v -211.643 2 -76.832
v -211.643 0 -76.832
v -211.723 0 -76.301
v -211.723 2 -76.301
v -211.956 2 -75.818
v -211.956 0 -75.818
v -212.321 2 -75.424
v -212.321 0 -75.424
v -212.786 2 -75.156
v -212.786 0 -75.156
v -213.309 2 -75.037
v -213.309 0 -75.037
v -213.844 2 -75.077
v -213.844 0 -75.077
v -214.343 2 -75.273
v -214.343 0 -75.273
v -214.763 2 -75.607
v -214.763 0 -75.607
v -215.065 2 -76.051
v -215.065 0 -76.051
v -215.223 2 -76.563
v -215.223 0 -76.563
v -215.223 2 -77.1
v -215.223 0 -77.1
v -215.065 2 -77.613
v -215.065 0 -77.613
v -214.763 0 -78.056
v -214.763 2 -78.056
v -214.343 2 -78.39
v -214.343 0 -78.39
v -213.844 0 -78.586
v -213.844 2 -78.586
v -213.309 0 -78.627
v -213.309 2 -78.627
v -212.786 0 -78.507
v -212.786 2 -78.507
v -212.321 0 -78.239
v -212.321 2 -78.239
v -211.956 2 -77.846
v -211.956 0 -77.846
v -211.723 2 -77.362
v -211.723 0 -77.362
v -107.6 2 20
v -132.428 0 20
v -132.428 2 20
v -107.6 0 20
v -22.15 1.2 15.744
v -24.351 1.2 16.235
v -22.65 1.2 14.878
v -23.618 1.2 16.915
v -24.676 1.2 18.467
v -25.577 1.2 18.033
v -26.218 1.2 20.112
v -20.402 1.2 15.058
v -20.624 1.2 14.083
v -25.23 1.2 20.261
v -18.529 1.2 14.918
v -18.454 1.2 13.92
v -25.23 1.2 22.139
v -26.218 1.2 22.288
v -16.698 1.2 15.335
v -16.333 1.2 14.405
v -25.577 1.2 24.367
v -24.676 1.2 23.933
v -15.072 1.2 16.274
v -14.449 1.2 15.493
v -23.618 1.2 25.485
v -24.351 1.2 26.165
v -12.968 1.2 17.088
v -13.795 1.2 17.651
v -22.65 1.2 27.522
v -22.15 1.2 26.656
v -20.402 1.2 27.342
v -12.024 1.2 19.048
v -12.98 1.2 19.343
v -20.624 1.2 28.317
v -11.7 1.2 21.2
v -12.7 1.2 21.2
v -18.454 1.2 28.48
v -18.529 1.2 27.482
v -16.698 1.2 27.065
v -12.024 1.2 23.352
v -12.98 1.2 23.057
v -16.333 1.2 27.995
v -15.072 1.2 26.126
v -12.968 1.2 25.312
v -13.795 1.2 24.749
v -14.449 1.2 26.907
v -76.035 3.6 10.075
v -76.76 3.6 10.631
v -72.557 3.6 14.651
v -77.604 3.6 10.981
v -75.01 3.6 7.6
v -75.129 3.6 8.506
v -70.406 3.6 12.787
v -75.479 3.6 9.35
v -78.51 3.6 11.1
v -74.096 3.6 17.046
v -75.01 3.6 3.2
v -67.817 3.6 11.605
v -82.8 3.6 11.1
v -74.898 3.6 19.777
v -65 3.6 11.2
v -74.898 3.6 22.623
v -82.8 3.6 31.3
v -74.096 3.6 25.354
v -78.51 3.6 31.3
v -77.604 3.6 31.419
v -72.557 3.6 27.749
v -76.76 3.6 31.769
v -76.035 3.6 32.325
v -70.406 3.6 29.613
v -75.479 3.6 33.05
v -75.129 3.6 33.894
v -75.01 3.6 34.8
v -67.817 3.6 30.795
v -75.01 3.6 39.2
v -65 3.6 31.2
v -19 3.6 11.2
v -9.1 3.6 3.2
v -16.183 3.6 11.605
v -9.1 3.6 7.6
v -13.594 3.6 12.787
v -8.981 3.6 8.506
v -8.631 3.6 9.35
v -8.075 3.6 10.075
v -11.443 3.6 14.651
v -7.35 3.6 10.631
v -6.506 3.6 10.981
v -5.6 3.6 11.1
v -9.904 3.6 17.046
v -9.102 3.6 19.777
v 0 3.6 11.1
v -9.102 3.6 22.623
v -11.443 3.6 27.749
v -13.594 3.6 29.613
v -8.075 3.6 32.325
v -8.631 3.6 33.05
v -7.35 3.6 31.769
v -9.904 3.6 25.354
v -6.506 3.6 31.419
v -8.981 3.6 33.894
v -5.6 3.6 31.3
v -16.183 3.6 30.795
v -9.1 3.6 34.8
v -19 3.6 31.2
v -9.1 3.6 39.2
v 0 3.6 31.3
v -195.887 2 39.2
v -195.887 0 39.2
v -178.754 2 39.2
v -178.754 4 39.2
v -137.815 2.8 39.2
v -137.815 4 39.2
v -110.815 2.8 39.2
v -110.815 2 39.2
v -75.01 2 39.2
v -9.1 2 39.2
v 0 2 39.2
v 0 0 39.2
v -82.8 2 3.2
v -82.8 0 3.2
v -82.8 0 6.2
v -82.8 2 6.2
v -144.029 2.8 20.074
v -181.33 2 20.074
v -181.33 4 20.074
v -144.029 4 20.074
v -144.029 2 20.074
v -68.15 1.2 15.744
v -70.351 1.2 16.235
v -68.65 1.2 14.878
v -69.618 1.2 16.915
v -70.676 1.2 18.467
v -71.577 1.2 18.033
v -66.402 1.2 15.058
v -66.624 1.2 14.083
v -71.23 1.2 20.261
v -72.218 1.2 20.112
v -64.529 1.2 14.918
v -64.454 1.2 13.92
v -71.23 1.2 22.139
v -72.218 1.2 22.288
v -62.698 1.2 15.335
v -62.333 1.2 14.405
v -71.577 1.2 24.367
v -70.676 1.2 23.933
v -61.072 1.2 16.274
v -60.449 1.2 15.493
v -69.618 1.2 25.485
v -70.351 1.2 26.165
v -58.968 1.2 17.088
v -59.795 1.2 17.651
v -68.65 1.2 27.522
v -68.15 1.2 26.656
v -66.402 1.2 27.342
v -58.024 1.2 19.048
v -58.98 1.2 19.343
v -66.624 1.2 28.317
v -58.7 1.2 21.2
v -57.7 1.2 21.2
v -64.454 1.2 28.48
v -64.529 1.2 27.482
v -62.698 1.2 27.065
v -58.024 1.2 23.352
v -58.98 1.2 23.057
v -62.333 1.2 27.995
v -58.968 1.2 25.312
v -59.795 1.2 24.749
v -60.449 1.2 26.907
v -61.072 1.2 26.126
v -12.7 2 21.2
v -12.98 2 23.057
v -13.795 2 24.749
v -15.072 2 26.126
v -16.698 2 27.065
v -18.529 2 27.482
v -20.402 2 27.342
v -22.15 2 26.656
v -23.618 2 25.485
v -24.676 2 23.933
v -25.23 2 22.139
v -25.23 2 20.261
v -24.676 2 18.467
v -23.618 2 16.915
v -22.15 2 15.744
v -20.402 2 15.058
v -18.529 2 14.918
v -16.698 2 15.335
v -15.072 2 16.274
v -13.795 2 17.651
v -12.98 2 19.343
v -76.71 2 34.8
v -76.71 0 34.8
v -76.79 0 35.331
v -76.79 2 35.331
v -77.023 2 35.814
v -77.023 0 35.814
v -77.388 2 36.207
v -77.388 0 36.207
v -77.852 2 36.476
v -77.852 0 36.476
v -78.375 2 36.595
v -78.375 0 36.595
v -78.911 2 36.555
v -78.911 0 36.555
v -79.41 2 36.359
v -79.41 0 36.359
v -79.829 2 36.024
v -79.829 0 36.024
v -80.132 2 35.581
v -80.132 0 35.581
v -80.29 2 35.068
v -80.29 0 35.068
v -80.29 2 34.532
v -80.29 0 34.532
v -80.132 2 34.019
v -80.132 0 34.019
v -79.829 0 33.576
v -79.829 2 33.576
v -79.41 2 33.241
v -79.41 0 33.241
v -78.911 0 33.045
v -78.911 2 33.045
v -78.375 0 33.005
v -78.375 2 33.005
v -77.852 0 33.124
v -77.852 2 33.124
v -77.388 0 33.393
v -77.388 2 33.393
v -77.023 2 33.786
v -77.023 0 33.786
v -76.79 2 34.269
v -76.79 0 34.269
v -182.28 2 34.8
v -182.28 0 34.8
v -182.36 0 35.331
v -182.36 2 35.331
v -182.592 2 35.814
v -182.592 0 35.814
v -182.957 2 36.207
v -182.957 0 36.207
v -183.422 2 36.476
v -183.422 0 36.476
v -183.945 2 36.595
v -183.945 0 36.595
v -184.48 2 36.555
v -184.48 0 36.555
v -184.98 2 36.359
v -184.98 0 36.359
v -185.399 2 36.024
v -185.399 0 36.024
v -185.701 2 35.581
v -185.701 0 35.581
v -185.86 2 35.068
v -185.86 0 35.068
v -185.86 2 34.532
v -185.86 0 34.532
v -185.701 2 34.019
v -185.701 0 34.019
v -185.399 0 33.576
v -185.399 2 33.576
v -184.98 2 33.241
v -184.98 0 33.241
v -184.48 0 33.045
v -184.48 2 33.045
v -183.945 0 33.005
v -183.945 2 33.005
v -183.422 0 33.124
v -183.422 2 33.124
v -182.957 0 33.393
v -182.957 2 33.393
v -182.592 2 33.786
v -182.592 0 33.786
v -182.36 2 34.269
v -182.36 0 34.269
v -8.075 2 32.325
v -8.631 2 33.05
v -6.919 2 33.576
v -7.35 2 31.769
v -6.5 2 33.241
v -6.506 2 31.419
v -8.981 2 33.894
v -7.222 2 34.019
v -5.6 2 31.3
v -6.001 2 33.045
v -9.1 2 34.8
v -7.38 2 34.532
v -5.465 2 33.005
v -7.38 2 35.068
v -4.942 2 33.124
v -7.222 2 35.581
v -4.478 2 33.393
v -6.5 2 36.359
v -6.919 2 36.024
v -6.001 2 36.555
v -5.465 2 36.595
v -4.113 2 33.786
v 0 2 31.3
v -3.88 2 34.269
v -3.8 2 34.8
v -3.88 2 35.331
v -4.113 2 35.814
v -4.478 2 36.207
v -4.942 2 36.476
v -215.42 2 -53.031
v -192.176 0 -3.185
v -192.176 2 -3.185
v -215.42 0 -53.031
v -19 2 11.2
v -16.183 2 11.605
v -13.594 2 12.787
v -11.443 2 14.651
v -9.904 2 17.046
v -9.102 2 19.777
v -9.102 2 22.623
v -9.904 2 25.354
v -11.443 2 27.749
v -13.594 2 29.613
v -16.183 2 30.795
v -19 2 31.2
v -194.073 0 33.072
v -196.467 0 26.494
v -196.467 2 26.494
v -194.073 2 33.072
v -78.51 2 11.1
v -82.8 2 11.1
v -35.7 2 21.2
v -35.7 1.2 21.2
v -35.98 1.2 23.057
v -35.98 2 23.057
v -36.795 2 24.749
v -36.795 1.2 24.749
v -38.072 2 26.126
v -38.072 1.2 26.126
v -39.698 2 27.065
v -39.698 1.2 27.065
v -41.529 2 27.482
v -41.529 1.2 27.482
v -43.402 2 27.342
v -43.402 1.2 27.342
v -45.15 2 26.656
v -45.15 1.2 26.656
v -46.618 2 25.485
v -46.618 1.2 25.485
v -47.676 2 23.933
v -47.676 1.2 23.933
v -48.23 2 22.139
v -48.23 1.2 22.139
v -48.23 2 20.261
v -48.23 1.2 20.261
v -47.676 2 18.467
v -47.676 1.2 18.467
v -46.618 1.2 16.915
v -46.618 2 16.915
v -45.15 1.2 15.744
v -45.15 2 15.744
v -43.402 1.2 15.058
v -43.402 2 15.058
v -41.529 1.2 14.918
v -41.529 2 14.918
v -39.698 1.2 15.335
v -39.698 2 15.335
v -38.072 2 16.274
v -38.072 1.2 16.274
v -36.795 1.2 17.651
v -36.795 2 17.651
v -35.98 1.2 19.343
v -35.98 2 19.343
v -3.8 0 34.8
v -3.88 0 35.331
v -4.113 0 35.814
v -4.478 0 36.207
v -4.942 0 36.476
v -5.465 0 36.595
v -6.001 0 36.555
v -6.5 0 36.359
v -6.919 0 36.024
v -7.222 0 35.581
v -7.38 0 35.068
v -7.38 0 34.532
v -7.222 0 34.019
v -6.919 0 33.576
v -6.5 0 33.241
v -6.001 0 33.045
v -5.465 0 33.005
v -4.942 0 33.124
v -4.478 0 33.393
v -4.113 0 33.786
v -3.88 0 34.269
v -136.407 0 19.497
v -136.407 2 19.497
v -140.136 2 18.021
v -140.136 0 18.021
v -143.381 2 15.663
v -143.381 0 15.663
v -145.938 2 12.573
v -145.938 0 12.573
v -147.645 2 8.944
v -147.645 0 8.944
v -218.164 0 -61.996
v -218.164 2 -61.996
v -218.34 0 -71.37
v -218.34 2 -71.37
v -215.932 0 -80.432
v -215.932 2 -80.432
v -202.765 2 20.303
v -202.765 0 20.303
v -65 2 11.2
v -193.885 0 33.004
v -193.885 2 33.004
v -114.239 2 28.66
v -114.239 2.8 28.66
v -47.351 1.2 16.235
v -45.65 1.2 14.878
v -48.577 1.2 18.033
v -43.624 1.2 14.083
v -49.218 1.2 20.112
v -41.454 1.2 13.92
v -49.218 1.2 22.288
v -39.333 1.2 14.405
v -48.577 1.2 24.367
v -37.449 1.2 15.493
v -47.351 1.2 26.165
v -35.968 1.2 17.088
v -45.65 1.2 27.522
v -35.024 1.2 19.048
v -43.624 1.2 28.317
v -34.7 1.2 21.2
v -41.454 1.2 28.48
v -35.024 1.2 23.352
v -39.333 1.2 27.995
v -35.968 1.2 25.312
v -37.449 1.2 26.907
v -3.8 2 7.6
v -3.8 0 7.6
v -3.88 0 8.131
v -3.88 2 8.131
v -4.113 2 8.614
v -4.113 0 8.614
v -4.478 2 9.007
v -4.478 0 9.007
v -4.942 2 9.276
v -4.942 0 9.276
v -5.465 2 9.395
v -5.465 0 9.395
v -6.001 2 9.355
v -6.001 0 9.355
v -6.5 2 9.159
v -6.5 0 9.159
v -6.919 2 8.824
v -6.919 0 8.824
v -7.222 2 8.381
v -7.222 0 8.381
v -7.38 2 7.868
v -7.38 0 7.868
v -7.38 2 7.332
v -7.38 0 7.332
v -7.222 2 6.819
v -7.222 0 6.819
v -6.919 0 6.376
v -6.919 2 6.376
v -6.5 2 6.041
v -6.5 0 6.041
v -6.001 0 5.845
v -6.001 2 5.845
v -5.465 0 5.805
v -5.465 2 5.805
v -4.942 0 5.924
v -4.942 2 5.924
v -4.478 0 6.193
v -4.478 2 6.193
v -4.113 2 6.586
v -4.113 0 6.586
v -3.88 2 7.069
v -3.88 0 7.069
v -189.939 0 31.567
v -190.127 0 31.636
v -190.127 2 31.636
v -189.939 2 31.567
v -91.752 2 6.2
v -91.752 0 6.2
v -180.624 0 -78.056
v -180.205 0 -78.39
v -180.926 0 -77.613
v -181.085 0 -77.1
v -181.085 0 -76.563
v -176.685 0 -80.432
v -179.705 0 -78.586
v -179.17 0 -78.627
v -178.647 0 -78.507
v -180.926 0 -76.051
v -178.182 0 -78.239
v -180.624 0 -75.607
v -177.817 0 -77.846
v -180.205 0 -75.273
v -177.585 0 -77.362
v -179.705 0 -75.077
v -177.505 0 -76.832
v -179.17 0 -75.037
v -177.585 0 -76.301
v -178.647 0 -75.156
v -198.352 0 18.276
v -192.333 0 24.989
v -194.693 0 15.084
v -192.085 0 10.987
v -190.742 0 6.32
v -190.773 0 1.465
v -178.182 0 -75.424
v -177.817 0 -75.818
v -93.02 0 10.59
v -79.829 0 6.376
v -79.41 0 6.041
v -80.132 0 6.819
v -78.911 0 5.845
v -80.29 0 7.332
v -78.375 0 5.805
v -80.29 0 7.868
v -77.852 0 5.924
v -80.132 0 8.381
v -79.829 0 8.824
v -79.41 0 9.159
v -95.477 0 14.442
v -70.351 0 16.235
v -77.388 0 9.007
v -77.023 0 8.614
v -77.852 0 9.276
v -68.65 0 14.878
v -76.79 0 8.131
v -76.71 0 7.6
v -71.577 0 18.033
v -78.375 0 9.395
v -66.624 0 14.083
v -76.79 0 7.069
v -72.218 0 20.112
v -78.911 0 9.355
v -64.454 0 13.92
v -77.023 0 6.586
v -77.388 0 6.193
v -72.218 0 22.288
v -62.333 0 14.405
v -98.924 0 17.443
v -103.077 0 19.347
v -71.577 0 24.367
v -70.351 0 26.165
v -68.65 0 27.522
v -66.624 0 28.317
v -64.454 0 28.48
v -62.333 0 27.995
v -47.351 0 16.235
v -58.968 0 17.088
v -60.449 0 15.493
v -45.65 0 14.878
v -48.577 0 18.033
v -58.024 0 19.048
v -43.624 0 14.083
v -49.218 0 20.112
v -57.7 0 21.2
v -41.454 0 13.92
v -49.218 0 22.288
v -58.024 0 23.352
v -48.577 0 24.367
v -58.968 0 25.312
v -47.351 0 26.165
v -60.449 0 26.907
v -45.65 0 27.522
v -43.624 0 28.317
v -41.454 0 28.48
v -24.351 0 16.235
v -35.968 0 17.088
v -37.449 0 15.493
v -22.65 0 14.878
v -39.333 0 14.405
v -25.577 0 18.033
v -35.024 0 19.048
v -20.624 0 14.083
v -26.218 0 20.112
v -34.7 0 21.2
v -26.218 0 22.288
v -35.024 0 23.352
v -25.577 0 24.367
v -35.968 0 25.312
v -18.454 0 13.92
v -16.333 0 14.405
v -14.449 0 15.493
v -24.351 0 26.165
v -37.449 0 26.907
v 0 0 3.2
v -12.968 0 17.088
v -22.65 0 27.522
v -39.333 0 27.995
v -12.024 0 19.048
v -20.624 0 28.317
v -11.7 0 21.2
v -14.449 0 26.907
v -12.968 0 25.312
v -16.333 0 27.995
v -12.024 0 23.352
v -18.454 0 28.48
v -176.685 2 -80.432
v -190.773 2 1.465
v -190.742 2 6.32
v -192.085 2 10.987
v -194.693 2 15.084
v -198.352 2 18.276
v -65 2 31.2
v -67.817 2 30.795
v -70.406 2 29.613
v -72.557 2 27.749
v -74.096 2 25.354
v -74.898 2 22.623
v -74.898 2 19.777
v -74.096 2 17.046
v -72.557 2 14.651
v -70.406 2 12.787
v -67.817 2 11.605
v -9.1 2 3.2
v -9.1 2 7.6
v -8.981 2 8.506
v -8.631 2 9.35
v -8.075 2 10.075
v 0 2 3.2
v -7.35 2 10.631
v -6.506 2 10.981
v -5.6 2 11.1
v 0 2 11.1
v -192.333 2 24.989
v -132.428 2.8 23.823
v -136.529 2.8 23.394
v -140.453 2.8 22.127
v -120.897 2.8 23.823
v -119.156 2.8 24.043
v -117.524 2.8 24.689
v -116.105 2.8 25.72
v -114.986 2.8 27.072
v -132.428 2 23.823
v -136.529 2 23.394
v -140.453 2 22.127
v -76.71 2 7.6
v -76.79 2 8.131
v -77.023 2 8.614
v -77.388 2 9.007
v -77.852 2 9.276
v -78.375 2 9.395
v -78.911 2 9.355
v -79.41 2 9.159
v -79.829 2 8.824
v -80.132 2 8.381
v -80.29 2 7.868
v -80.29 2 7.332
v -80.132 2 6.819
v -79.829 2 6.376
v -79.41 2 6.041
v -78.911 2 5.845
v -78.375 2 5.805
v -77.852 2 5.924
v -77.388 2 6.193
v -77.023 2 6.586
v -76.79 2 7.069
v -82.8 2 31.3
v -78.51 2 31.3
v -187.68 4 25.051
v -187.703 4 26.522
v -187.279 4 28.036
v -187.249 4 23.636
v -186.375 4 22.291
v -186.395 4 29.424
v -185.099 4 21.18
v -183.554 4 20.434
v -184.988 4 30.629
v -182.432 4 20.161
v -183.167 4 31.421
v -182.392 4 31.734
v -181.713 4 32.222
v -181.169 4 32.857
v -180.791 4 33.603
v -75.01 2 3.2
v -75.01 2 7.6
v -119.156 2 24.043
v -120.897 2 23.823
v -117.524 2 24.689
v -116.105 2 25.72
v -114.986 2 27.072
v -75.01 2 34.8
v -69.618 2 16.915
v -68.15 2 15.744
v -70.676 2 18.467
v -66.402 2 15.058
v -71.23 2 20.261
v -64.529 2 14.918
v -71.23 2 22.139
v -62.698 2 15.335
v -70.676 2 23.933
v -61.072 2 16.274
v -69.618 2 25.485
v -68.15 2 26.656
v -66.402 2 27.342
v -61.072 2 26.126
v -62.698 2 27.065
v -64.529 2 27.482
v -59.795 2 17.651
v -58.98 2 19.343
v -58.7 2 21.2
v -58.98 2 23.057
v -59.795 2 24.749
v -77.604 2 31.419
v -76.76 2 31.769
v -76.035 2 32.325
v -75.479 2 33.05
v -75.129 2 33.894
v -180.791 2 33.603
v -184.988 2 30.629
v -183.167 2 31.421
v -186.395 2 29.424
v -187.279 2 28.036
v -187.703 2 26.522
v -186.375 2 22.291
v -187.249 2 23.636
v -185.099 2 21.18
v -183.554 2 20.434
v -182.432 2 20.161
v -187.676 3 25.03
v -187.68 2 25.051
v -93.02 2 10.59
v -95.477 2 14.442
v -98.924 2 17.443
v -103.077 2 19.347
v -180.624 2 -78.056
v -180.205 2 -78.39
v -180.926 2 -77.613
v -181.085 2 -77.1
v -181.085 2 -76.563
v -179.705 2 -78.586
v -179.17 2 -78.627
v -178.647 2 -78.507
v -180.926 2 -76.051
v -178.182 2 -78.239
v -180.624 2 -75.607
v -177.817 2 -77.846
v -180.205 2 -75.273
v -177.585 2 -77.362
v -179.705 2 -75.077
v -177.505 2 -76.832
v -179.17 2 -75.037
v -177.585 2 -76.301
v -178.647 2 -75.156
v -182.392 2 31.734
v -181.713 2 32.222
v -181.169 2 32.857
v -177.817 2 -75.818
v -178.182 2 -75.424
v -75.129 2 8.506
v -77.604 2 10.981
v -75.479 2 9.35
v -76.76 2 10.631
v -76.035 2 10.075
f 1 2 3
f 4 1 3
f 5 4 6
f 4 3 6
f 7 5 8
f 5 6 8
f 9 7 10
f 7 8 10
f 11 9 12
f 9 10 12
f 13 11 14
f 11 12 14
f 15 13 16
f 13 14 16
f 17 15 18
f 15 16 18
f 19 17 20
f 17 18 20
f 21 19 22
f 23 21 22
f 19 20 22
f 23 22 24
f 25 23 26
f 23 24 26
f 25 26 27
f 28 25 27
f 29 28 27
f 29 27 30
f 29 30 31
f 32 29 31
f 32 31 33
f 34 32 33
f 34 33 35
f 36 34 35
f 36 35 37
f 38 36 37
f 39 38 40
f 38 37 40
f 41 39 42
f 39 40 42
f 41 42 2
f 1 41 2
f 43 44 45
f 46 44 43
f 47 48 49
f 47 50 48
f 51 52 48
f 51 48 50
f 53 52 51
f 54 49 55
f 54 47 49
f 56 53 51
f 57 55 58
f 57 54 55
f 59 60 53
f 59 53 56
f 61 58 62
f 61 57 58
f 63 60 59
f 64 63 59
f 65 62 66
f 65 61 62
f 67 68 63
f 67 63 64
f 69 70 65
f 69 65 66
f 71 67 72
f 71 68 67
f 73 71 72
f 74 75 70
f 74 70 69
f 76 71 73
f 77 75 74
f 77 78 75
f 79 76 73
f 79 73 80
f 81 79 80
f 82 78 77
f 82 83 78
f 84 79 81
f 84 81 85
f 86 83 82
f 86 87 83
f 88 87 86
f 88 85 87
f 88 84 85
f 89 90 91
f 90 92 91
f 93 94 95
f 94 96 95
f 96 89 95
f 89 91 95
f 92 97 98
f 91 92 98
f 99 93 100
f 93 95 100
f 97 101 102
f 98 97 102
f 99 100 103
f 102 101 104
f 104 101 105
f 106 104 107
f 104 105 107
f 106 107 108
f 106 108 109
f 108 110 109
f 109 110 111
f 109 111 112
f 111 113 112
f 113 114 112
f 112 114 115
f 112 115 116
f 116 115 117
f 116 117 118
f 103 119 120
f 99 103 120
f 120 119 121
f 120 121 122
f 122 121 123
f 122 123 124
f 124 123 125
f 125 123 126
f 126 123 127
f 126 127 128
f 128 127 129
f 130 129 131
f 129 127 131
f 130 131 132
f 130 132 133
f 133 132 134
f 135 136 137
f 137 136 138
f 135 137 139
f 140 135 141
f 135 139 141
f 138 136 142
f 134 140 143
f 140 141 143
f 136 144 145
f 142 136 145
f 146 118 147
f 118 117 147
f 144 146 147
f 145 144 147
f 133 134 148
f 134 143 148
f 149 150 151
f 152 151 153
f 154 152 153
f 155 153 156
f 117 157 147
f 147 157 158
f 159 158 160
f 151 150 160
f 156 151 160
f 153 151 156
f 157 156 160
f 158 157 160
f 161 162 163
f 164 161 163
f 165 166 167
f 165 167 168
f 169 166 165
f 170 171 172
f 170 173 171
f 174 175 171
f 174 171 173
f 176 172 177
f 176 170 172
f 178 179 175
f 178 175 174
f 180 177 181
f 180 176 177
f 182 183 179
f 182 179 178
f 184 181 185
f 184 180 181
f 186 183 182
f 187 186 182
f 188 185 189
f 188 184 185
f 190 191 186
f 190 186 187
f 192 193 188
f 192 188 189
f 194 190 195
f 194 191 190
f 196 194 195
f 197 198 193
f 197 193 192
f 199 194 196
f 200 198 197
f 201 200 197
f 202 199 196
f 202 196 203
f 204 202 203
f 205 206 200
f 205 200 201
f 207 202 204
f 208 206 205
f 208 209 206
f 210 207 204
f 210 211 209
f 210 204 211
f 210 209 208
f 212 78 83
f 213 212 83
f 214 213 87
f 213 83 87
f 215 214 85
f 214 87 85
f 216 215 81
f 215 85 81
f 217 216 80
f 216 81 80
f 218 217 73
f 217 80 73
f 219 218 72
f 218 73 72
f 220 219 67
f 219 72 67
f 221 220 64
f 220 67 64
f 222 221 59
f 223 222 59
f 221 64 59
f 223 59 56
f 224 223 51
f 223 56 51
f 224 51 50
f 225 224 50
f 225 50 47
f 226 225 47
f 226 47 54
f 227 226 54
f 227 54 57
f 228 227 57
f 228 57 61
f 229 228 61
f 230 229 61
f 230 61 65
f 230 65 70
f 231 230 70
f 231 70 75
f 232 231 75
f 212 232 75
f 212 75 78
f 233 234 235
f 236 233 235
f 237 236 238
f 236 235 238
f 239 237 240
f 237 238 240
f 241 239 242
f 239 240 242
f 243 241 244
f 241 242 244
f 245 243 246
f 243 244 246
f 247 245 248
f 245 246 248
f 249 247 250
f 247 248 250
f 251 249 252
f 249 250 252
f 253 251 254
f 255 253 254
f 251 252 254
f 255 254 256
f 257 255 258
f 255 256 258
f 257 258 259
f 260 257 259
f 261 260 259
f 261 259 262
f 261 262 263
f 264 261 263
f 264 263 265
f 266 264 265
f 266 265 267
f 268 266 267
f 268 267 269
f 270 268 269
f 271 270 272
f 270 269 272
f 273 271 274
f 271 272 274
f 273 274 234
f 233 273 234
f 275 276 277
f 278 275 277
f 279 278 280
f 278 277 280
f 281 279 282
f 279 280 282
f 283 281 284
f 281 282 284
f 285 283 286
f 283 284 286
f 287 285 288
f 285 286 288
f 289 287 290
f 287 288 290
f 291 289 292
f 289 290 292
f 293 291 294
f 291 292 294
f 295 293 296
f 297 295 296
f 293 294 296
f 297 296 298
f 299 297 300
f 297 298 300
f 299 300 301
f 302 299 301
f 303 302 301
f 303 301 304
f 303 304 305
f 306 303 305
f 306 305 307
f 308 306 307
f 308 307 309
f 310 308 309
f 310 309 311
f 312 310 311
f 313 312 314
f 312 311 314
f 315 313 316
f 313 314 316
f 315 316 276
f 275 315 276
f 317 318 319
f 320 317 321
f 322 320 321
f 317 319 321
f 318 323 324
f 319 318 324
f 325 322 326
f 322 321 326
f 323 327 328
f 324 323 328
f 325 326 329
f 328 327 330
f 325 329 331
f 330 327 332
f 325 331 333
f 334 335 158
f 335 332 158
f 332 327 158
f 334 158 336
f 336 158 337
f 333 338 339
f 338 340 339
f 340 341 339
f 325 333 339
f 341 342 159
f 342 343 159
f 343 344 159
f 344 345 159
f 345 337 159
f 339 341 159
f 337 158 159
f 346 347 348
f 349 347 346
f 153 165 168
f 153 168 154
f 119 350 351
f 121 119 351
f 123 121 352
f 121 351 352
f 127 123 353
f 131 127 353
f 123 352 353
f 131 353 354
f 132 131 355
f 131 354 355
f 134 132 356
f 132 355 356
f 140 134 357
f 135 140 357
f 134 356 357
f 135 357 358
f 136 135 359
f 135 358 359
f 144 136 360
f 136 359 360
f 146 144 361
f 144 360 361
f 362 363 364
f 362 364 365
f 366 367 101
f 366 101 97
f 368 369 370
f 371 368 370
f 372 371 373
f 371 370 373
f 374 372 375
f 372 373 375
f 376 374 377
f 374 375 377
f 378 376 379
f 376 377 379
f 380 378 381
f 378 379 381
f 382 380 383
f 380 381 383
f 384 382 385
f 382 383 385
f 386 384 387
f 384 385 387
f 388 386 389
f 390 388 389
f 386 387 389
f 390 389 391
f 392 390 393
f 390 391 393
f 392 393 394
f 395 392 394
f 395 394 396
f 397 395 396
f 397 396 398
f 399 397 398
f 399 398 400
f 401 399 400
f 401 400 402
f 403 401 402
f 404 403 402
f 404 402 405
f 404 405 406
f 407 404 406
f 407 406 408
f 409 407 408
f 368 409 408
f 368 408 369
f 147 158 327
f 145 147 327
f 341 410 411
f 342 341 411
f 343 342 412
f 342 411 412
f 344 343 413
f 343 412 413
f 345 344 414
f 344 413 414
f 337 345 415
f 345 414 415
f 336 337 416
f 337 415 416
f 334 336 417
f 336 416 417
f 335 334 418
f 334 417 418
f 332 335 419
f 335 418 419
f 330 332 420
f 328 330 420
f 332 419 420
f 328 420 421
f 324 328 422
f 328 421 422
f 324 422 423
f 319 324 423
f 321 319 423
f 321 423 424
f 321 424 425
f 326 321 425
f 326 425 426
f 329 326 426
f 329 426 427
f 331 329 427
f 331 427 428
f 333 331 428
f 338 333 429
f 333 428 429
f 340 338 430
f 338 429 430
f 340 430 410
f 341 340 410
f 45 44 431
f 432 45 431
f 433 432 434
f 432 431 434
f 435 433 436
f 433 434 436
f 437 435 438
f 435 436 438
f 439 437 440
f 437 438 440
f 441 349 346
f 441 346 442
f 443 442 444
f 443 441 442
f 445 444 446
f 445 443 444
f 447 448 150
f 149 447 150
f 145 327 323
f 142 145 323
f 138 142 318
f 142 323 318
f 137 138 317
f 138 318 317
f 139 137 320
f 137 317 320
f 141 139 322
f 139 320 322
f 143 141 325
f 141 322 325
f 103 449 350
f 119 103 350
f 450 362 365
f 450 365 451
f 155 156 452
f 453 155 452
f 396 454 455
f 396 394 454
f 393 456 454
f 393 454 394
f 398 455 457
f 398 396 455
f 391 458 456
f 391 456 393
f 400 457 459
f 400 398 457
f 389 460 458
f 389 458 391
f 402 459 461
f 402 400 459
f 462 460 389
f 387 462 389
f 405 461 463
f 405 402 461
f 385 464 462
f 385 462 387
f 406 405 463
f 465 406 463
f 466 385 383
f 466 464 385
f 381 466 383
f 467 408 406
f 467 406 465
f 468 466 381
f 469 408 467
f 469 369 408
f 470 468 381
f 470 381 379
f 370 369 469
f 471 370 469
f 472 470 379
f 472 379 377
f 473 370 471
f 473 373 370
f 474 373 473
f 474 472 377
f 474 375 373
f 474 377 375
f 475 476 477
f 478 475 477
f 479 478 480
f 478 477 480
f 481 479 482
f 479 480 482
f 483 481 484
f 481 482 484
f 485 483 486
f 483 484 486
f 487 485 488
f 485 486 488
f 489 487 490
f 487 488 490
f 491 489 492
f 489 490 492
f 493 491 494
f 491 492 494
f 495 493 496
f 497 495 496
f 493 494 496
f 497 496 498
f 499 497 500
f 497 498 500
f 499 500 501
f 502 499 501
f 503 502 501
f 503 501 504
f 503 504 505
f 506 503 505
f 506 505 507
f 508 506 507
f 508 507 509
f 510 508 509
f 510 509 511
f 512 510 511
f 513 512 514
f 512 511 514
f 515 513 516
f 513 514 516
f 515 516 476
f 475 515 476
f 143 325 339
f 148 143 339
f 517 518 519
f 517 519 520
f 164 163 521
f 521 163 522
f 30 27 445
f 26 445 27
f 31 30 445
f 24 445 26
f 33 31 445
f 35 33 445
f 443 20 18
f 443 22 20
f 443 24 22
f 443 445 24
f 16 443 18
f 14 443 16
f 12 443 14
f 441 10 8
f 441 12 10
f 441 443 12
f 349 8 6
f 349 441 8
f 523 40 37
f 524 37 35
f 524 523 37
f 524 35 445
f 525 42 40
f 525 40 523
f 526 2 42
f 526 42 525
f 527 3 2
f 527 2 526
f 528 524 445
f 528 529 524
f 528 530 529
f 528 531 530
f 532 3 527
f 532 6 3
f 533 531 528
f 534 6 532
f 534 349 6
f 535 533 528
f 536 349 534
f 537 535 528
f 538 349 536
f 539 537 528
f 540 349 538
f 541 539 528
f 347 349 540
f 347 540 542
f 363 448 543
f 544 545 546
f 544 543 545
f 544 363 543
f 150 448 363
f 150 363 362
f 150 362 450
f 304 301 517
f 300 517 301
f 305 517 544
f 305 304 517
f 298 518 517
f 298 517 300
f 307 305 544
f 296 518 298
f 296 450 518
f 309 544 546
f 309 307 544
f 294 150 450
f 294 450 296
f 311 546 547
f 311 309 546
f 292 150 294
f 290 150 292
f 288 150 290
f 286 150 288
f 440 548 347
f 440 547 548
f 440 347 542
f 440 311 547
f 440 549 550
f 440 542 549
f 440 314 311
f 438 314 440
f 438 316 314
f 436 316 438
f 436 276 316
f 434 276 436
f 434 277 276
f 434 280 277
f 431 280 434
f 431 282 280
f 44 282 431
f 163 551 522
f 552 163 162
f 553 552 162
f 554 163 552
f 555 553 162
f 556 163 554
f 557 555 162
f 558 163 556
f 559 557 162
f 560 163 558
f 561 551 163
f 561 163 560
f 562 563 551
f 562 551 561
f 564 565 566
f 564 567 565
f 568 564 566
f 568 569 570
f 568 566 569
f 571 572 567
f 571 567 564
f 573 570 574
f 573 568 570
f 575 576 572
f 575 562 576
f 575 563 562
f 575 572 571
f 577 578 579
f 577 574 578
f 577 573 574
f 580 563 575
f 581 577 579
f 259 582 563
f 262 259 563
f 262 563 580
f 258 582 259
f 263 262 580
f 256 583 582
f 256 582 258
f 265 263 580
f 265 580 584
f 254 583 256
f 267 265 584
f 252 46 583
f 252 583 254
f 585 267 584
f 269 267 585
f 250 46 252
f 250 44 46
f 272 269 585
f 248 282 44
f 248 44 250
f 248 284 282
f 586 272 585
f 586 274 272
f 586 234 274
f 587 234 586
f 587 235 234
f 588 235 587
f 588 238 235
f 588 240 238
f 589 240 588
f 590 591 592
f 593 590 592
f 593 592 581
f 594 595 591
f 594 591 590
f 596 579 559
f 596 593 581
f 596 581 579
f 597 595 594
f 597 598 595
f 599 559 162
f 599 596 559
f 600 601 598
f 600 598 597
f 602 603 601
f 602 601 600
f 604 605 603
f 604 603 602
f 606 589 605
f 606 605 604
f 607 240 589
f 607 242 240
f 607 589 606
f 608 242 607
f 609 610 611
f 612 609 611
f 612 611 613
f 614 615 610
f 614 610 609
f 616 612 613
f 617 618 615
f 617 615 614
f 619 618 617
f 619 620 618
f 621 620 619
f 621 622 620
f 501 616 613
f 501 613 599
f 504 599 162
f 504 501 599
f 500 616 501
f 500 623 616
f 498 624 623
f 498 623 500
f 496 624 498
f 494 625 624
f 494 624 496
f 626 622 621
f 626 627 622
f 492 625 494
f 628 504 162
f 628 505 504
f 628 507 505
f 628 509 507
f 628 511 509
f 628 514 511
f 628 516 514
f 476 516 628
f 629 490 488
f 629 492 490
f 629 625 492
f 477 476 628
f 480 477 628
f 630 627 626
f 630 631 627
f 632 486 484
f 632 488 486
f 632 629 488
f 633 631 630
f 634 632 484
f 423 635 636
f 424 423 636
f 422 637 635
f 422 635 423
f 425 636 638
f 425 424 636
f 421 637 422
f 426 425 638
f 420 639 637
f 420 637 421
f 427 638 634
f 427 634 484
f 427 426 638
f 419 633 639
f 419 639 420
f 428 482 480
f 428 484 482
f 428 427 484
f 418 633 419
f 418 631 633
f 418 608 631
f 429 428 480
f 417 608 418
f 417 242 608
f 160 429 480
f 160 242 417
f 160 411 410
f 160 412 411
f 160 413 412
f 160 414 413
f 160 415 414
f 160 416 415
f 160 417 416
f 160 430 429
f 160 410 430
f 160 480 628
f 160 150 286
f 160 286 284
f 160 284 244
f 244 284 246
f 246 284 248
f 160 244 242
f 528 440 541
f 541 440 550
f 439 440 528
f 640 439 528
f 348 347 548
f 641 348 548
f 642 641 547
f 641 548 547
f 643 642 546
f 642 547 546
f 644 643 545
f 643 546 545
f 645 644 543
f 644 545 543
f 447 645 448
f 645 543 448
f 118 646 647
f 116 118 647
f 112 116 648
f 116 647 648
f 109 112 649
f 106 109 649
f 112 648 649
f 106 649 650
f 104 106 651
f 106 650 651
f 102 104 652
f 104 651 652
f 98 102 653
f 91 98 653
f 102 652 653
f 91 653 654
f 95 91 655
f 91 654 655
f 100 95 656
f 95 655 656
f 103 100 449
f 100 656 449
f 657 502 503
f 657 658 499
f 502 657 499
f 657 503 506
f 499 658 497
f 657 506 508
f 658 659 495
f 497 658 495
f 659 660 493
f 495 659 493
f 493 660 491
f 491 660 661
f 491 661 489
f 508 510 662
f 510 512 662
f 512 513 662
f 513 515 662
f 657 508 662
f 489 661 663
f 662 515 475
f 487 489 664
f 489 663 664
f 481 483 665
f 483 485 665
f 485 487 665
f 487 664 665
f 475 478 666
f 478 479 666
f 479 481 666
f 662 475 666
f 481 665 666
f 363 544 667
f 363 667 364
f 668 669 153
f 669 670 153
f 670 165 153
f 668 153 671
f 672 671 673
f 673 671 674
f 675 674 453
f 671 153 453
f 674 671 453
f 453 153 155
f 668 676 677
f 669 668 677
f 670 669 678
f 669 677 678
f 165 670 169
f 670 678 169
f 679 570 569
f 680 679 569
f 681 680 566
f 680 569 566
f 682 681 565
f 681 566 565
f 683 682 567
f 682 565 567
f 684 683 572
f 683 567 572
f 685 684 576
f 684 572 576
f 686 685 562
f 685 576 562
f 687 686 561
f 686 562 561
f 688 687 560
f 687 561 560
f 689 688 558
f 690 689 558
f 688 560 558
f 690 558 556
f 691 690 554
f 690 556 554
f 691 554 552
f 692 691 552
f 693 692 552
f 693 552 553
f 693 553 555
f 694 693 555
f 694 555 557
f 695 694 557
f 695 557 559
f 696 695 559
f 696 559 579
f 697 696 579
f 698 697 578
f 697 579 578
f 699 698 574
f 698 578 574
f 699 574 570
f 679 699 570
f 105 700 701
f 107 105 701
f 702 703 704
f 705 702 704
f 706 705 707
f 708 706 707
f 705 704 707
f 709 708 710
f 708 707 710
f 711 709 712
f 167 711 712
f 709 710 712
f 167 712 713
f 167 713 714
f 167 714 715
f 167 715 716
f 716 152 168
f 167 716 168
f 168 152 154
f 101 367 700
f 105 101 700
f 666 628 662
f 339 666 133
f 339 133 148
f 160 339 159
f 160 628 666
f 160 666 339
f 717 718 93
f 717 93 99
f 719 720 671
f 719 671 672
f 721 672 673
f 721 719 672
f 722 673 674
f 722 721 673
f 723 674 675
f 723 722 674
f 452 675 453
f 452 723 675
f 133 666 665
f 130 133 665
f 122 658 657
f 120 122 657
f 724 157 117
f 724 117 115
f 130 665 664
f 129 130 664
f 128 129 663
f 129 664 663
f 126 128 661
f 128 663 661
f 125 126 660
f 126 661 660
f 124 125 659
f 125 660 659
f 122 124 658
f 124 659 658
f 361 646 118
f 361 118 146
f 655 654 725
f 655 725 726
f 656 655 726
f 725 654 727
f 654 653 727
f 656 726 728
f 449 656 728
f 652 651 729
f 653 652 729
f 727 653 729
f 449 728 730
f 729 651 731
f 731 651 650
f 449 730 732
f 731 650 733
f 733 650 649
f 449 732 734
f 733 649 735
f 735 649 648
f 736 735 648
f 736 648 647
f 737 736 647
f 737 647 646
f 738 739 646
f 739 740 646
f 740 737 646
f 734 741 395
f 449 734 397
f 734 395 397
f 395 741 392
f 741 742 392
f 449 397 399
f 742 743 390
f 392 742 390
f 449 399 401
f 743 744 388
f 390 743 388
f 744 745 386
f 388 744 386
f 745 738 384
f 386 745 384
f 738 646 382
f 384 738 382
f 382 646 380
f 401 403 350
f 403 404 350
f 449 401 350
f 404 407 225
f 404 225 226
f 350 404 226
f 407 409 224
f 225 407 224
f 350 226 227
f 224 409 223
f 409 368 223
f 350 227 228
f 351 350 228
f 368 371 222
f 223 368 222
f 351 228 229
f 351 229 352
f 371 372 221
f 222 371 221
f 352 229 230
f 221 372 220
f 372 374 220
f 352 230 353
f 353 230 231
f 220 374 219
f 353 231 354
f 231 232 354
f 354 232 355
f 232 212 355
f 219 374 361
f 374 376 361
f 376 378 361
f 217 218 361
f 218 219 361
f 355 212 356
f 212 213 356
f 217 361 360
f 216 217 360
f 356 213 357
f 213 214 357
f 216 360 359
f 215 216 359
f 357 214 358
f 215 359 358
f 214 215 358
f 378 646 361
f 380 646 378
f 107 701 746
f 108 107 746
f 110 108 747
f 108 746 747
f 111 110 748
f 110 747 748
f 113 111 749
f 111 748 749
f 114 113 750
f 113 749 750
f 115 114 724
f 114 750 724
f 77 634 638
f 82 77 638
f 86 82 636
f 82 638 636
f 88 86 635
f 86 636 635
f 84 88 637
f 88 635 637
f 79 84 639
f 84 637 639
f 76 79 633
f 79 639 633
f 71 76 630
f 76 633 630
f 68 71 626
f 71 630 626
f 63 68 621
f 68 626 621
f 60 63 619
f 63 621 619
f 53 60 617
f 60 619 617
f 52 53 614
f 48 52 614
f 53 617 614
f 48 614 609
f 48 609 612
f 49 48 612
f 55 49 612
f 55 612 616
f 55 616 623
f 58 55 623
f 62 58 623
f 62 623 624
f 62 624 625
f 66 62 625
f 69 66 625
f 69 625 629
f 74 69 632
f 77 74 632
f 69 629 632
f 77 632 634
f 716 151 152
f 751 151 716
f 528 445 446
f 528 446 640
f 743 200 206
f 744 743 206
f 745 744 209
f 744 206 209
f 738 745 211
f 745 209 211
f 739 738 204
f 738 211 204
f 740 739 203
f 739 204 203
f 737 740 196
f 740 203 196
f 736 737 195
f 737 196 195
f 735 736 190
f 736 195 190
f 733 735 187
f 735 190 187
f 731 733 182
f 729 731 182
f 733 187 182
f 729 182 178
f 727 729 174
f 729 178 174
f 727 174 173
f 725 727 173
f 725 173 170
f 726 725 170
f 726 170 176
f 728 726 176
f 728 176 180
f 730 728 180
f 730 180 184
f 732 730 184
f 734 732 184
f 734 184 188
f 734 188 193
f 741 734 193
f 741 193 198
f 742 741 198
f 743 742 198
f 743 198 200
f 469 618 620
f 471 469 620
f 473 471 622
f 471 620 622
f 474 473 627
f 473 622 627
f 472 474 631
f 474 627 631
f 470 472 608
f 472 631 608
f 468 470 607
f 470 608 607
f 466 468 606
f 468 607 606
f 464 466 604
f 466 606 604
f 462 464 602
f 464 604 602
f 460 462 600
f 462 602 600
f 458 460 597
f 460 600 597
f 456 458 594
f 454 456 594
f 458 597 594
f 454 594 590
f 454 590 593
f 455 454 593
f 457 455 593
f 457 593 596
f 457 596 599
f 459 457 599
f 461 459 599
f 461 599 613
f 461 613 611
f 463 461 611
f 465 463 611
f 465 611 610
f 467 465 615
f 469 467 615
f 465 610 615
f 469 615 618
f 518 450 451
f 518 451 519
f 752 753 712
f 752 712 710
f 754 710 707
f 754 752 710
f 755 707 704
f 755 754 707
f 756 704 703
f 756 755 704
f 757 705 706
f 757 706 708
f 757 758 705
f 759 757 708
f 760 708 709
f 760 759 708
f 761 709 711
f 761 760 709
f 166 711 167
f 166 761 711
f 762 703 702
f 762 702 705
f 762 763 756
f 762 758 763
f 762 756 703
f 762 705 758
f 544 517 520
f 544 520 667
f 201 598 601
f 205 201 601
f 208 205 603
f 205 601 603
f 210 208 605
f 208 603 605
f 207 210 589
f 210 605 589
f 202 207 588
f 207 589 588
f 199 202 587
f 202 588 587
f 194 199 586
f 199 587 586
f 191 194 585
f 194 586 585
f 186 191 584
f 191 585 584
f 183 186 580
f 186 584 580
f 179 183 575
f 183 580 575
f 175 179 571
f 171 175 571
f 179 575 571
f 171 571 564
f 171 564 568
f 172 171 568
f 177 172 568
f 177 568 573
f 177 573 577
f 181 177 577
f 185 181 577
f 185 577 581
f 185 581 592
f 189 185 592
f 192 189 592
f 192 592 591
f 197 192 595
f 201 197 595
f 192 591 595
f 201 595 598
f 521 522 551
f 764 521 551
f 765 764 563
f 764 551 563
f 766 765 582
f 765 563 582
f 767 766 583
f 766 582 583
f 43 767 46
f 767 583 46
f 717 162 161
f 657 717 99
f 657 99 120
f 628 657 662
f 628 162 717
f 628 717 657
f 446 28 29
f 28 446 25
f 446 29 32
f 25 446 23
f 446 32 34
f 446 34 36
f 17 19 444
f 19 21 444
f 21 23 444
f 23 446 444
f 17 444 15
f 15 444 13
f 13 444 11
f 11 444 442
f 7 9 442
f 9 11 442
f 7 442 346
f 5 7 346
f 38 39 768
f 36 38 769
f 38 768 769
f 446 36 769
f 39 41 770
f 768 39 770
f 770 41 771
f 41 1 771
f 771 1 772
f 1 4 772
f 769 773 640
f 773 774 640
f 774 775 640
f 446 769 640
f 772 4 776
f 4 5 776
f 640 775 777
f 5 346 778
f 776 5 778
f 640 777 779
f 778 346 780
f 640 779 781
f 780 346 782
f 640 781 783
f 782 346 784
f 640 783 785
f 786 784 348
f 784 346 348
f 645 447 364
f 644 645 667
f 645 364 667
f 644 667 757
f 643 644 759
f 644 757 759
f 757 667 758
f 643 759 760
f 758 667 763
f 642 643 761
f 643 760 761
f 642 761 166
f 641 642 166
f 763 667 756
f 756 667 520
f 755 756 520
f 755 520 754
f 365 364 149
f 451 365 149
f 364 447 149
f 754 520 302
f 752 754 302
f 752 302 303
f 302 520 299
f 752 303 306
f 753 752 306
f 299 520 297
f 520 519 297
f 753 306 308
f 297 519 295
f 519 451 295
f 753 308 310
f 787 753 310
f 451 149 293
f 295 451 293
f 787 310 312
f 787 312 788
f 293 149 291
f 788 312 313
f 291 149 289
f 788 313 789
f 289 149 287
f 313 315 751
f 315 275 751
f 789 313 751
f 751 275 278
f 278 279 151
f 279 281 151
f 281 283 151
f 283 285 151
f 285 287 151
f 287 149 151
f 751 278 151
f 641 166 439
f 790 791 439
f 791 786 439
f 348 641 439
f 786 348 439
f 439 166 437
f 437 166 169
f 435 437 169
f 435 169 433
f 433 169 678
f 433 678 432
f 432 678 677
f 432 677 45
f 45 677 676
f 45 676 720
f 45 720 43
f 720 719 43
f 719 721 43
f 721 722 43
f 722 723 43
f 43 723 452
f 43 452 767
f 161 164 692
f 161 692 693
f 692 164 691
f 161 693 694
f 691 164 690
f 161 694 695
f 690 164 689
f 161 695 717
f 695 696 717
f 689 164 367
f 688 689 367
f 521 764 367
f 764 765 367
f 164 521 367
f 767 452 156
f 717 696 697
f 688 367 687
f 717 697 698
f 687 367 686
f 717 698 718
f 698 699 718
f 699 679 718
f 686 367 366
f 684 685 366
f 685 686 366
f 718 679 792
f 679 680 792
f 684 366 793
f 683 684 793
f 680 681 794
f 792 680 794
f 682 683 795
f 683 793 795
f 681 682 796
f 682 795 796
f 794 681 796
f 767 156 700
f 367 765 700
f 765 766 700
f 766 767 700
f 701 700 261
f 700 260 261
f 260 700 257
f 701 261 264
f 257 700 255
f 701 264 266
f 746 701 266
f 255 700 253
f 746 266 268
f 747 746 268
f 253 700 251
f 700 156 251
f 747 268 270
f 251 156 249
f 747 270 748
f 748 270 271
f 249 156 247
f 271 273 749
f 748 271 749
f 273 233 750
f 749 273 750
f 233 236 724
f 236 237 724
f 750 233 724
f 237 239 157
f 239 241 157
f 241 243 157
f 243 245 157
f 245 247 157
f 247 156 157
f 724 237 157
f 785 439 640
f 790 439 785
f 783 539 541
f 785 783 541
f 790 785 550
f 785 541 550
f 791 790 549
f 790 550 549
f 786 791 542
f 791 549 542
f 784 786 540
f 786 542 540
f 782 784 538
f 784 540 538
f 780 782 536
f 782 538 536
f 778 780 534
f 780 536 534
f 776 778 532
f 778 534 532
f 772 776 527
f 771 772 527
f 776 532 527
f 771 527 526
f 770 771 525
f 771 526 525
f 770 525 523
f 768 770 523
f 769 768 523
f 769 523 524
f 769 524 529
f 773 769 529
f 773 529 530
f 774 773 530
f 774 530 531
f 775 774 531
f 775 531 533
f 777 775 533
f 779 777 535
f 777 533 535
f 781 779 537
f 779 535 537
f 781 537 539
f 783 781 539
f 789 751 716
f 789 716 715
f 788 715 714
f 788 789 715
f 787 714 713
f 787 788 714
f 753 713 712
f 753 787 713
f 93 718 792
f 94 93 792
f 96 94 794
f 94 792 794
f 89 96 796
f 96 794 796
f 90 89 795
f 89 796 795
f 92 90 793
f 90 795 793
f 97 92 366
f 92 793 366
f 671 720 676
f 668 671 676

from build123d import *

# Parameters (mm, degrees)
EXTRUDE086_DEPTH = 0.8
EXTRUDE087_DEPTH = 2
SKETCH084_R      = 1.8
EXTRUDE084_DEPTH = 1.6
SKETCH082_W      = 82.8
SKETCH082_H      = 36
SKETCH082_R      = 1.8
EXTRUDE082_DEPTH = 1.6
SKETCH076_R      = 7.3
EXTRUDE077_DEPTH = 1.2
SKETCH074_R      = 1.8
SKETCH074_R_2    = 6.3
EXTRUDE076_DEPTH = 2


with BuildPart() as extrude_lato_sx_pistola_rialzo_centrale:
    # Sketch086 → Extrude086 (new body)
    with BuildSketch(Plane(origin=(0, 0, 2), x_dir=(1, 0, 0), z_dir=(0, -1, 0))):
        with BuildLine():
            Line((-137.814627, 37.2), (-144.028897, 18.074442))
            ThreePointArc((-132.428405, 21.823197), (-138.523989, 20.862741), (-144.028897, 18.074442))
            Line((-120.896651, 21.823197), (-132.428405, 21.823197))
            ThreePointArc((-120.896651, 21.823197), (-116.782154, 23.160078), (-114.239255, 26.660078))
            Line((-110.814627, 37.2), (-114.239255, 26.660078))
            Line((-137.814627, 37.2), (-110.814627, 37.2))
        make_face()
    extrude(amount=-EXTRUDE086_DEPTH)


with BuildPart() as extrude_lato_sx_pistola_rialzo_centrale_1:
    # Extrude086 placement: moved
    add(extrude_lato_sx_pistola_rialzo_centrale.part.moved(Location((0, 2, 0))))


with BuildPart() as extrude087:
    # Sketch087 → Extrude087 (new body)
    with BuildSketch(Plane.XZ):
        with BuildLine():
            add(Edge.make_bspline(
                [(-183.167024, 31.421083), (-188.478801, 29.986374), (-187.676319, 25.030408), (-186.873836, 20.074442), (-181.329747, 20.074442)],
                knots=[5.002901, 5.002901, 5.002901, 6.428441, 6.428441, 7.853982, 7.853982, 7.853982], degree=2, weights=[1, 0.756553, 1, 0.756553, 1]))
            Line((-181.329747, 20.074442), (-144.028897, 20.074442))
            Line((-144.028897, 20.074442), (-137.814627, 39.2))
            Line((-137.814627, 39.2), (-178.753577, 39.2))
            Line((-178.753577, 39.2), (-180.790744, 33.602929))
            ThreePointArc((-180.790744, 33.602929), (-181.712516, 32.221901), (-183.167024, 31.421083))
        make_face()
    extrude(amount=-EXTRUDE087_DEPTH)


with BuildPart() as extrude087_1:
    # Extrude087 placement: moved
    add(extrude087.part.moved(Location((0, 2, 0))))


with BuildPart() as extrude084:
    # Sketch084 → Extrude084 (new body)
    with BuildSketch(Plane.XZ):
        with BuildLine():
            ThreePointArc((-78.51, 31.3), (-76.035126, 32.325126), (-75.01, 34.8))
            Line((-75.01, 39.2), (-75.01, 34.8))
            Line((-82.8, 39.2), (-75.01, 39.2))
            Line((-82.8, 31.3), (-82.8, 39.2))
            Line((-82.8, 31.3), (-78.51, 31.3))
        make_face()
        with Locations((-78.51, 34.8)):
            Circle(SKETCH084_R, mode=Mode.SUBTRACT)
        with BuildLine():
            ThreePointArc((-9.1, 34.8), (-8.074874, 32.325126), (-5.6, 31.3))
            Line((-5.6, 31.3), (0, 31.3))
            Line((0, 39.2), (0, 31.3))
            Line((-9.1, 39.2), (0, 39.2))
            Line((-9.1, 39.2), (-9.1, 34.8))
        make_face()
        with Locations((-5.6, 34.8)):
            Circle(SKETCH084_R, mode=Mode.SUBTRACT)
        with BuildLine():
            ThreePointArc((-75.01, 7.6), (-76.035126, 10.074874), (-78.51, 11.1))
            Line((-82.8, 11.1), (-78.51, 11.1))
            Line((-82.8, 3.2), (-82.8, 11.1))
            Line((-75.01, 3.2), (-82.8, 3.2))
            Line((-75.01, 7.6), (-75.01, 3.2))
        make_face()
        with Locations((-78.51, 7.6)):
            Circle(SKETCH084_R, mode=Mode.SUBTRACT)
        with BuildLine():
            ThreePointArc((-5.6, 11.1), (-8.074874, 10.074874), (-9.1, 7.6))
            Line((-9.1, 7.6), (-9.1, 3.2))
            Line((0, 3.2), (-9.1, 3.2))
            Line((0, 11.1), (0, 3.2))
            Line((0, 11.1), (-5.6, 11.1))
        make_face()
        with Locations((-5.6, 7.6)):
            Circle(SKETCH084_R, mode=Mode.SUBTRACT)
    extrude(amount=-EXTRUDE084_DEPTH)


with BuildPart() as extrude084_1:
    # Extrude084 placement: moved
    add(extrude084.part.moved(Location((0, 2, 0))))


with BuildPart() as cut047:
    # Sketch082 → Extrude082 (new body)
    with BuildSketch(Plane.XZ):
        with Locations((-41.4, 21.2)):
            Rectangle(SKETCH082_W, SKETCH082_H)
        with Locations((-78.51, 34.8)):
            Circle(SKETCH082_R, mode=Mode.SUBTRACT)
        with Locations((-5.6, 34.8)):
            Circle(SKETCH082_R, mode=Mode.SUBTRACT)
        with Locations((-5.6, 7.6)):
            Circle(SKETCH082_R, mode=Mode.SUBTRACT)
        with Locations((-78.51, 7.6)):
            Circle(SKETCH082_R, mode=Mode.SUBTRACT)
        with BuildLine():
            ThreePointArc((-65, 31.2), (-75, 21.2), (-65, 11.2))
            Line((-65, 11.2), (-19, 11.2))
            ThreePointArc((-19, 11.2), (-9, 21.2), (-19, 31.2))
            Line((-65, 31.2), (-19, 31.2))
        make_face(mode=Mode.SUBTRACT)
    extrude(amount=-EXTRUDE082_DEPTH)


with BuildPart() as cut047_1:
    # Extrude082 placement: moved
    add(cut047.part.moved(Location((0, 2, 0))))

    # Cut047: cut Extrude084
    add(extrude084_1.part, mode=Mode.SUBTRACT)


with BuildPart() as extrude_lato_sx_pistola_scavi_pulsanti:
    # Sketch076 → Extrude077 (new body)
    with BuildSketch(Plane.XZ):
        with Locations((-65, 21.2)):
            Circle(SKETCH076_R)
        with Locations((-42, 21.2)):
            Circle(SKETCH076_R)
        with Locations((-19, 21.2)):
            Circle(SKETCH076_R)
    extrude(amount=-EXTRUDE077_DEPTH)


with BuildPart() as fusion007:
    # Sketch074 → Extrude076 (new body)
    with BuildSketch(Plane.XZ):
        with BuildLine():
            Line((-82.8, 3.2), (0, 3.2))
            Line((0, 3.2), (0, 39.2))
            Line((-195.886839, 39.2), (0, 39.2))
            Line((-202.764796, 20.302968), (-195.886839, 39.2))
            ThreePointArc((-192.175575, -3.18451), (-192.085048, 10.987093), (-202.764796, 20.302968))
            Line((-192.175575, -3.18451), (-215.419579, -53.031439))
            ThreePointArc((-215.419579, -53.031439), (-218.578907, -66.677212), (-215.93199, -80.431568))
            Line((-215.93199, -80.431568), (-176.68528, -80.431568))
            Line((-147.645309, 8.944272), (-176.68528, -80.431568))
            ThreePointArc((-132.428405, 20), (-141.832969, 16.944272), (-147.645309, 8.944272))
            Line((-132.428405, 20), (-107.6, 20))
            ThreePointArc((-91.751972, 6.2), (-97.09286, 16.066483), (-107.6, 20))
            Line((-82.8, 6.2), (-91.751972, 6.2))
            Line((-82.8, 3.2), (-82.8, 6.2))
        make_face()
        with Locations((-213.443268, -76.831568)):
            Circle(SKETCH074_R, mode=Mode.SUBTRACT)
        with Locations((-179.304663, -76.831568)):
            Circle(SKETCH074_R, mode=Mode.SUBTRACT)
        with Locations((-184.079668, 34.8)):
            Circle(SKETCH074_R, mode=Mode.SUBTRACT)
        with Locations((-78.51, 34.8)):
            Circle(SKETCH074_R, mode=Mode.SUBTRACT)
        with Locations((-78.51, 7.6)):
            Circle(SKETCH074_R, mode=Mode.SUBTRACT)
        with Locations((-5.6, 34.8)):
            Circle(SKETCH074_R, mode=Mode.SUBTRACT)
        with Locations((-5.6, 7.6)):
            Circle(SKETCH074_R, mode=Mode.SUBTRACT)
        with Locations((-19, 21.2)):
            Circle(SKETCH074_R_2, mode=Mode.SUBTRACT)
        with Locations((-42, 21.2)):
            Circle(SKETCH074_R_2, mode=Mode.SUBTRACT)
        with Locations((-65, 21.2)):
            Circle(SKETCH074_R_2, mode=Mode.SUBTRACT)
        Polygon((-189.938695, 31.567195), (-192.332836, 24.989347), (-196.467483, 26.494236), (-194.073342, 33.072084), (-193.885404, 33.00368), (-190.126633, 31.635599), align=None, mode=Mode.SUBTRACT)
    extrude(amount=-EXTRUDE076_DEPTH)

    # Cut044: cut Extrude lato sx pistola - scavi pulsanti
    add(extrude_lato_sx_pistola_scavi_pulsanti.part, mode=Mode.SUBTRACT)

    # Fusion005: union Cut047
    add(cut047_1.part)

    # Fusion007: union Extrude lato sx pistola - rialzo centrale, Extrude087
    add(extrude_lato_sx_pistola_rialzo_centrale_1.part)
    add(extrude087_1.part)


solid = fusion007.part
